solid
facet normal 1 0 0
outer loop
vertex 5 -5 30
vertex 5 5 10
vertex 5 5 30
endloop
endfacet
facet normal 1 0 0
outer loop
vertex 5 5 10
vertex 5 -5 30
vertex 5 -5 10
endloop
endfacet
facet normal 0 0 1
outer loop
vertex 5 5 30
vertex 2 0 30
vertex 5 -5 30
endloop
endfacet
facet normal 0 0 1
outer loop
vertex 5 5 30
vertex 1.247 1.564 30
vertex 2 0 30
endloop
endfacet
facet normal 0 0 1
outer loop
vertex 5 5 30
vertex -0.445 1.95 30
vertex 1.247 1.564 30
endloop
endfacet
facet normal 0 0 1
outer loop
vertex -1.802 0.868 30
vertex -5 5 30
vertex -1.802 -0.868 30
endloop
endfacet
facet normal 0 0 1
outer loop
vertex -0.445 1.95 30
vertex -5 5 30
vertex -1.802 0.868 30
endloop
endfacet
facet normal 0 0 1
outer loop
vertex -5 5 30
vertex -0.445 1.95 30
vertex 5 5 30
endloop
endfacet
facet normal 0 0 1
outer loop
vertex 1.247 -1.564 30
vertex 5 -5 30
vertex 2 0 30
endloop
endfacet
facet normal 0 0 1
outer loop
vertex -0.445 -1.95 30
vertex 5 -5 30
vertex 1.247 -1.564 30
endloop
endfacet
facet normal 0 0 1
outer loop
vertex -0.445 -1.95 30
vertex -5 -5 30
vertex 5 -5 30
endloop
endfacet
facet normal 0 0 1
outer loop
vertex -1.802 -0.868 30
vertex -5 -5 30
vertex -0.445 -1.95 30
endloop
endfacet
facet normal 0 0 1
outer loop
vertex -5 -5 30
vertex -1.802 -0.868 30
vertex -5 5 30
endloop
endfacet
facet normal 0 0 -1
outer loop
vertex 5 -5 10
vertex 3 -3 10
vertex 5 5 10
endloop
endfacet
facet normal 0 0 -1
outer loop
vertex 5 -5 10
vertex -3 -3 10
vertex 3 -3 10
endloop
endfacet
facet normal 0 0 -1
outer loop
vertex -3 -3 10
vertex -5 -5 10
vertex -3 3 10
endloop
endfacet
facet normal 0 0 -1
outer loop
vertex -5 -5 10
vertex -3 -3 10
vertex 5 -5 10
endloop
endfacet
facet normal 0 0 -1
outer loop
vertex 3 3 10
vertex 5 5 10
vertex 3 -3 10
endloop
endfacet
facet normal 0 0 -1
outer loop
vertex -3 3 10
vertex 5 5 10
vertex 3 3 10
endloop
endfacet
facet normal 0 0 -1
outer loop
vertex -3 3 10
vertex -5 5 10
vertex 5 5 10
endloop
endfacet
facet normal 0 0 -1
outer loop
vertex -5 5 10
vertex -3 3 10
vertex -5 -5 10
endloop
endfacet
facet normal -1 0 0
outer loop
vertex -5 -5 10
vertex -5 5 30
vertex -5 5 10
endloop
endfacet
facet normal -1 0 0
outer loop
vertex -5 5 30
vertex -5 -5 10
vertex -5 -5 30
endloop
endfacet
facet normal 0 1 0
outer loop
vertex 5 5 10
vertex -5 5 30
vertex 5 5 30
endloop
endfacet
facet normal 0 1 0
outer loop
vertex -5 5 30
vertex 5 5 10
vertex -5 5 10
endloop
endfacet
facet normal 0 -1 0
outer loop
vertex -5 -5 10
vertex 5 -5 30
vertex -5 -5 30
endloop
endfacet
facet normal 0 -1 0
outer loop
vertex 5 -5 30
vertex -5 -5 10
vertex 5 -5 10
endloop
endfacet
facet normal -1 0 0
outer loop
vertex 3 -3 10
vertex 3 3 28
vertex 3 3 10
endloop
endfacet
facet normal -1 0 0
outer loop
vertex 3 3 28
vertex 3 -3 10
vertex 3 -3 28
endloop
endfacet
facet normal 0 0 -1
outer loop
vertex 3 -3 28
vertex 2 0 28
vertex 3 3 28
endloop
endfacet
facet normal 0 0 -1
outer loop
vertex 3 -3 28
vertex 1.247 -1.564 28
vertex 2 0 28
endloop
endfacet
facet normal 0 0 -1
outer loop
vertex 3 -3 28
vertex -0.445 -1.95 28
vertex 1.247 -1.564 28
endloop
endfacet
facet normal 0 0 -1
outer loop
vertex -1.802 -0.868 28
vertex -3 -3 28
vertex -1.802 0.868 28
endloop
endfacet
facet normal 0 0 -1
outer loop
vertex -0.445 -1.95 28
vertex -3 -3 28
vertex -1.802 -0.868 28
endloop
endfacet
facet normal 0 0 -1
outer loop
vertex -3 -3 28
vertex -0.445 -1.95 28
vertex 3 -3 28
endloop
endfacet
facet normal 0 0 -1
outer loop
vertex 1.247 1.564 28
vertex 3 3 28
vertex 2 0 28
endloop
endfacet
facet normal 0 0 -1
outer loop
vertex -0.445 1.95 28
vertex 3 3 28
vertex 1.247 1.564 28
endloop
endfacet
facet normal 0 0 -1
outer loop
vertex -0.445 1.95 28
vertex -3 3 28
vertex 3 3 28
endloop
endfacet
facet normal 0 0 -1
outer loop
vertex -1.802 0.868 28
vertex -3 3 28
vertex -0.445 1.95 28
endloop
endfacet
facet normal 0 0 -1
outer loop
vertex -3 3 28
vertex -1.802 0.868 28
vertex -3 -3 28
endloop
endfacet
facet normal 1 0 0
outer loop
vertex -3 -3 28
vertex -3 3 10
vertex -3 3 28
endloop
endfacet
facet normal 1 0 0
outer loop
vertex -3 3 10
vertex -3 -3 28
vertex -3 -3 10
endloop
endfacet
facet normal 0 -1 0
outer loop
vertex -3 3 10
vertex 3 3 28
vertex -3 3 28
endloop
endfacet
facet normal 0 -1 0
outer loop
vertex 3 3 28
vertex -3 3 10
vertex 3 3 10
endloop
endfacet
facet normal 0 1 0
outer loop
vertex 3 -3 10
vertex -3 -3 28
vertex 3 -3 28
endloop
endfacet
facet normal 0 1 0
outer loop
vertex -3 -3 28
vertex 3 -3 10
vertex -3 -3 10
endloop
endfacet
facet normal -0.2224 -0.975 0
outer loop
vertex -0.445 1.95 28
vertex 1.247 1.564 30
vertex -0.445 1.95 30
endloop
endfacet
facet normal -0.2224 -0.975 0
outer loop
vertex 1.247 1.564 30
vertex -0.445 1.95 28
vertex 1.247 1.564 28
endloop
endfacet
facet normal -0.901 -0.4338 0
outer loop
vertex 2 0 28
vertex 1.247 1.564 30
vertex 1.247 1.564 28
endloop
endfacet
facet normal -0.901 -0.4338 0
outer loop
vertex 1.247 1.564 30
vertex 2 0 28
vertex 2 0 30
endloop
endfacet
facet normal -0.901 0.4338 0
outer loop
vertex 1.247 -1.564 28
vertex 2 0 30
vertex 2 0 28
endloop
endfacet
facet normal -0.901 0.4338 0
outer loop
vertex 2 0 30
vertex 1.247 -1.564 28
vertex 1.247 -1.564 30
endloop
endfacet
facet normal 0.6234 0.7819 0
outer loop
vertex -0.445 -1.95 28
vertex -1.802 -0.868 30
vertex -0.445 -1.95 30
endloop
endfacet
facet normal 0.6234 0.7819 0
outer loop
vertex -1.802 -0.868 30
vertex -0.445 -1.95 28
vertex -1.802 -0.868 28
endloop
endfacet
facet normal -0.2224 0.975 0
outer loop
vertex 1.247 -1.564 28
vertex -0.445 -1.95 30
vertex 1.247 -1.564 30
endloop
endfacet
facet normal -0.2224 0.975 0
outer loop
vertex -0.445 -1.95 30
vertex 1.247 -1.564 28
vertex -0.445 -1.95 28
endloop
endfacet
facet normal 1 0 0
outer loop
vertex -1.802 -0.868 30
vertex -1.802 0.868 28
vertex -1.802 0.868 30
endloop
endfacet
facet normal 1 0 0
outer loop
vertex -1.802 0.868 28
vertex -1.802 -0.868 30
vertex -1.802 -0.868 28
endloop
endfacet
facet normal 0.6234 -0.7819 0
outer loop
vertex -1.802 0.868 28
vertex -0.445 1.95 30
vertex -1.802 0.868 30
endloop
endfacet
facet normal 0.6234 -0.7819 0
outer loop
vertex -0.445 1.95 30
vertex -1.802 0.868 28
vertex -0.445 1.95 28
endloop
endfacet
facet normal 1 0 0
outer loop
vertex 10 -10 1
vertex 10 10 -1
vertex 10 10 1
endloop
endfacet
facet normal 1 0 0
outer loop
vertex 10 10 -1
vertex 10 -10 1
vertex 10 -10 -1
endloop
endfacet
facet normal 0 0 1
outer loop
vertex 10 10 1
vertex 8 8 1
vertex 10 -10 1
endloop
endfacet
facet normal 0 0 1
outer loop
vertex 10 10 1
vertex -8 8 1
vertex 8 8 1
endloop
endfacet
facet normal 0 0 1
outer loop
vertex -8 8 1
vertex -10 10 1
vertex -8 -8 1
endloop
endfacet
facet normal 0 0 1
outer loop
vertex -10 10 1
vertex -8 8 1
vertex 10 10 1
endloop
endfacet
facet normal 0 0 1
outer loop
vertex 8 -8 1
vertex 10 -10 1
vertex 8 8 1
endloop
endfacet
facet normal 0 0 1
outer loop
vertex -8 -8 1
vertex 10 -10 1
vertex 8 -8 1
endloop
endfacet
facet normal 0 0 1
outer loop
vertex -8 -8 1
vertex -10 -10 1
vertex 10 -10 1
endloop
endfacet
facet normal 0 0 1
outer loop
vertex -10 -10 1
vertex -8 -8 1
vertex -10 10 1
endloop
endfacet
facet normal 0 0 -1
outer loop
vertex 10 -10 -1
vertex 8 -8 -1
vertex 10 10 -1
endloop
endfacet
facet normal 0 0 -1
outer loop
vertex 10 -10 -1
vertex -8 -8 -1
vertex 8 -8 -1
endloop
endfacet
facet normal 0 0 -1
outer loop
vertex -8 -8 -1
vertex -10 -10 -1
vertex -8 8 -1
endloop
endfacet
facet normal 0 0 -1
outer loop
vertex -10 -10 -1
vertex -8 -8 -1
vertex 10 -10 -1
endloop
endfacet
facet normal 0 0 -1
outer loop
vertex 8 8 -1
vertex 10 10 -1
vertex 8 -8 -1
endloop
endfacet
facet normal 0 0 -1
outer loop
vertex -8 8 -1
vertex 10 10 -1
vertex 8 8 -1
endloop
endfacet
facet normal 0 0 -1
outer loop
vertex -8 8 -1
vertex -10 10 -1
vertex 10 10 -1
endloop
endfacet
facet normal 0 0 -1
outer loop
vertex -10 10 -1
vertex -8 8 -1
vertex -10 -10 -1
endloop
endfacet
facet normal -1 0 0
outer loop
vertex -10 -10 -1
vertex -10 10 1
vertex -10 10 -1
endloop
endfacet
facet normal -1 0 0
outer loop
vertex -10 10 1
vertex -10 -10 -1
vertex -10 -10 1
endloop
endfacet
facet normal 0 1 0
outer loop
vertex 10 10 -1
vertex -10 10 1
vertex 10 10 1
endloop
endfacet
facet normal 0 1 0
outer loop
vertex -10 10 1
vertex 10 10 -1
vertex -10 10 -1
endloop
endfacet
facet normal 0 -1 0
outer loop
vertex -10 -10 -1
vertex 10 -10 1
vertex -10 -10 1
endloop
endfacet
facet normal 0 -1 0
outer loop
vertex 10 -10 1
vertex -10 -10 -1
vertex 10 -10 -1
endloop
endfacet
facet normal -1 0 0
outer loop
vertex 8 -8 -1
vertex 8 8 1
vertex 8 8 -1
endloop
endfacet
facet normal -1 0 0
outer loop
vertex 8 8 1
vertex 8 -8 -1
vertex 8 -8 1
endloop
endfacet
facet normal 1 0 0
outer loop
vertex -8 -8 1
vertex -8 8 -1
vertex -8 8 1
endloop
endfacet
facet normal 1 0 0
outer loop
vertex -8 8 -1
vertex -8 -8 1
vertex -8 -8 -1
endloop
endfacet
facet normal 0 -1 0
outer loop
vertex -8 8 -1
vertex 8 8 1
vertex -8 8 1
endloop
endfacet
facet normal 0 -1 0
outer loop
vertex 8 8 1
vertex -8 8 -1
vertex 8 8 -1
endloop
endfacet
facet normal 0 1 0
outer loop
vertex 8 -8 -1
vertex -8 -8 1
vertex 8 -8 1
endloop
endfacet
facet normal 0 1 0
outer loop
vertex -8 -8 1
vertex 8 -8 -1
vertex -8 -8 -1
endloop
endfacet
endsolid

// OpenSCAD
dh = 10;
width = 10;
height = 10;
cheight = 20;
thickness = 2;

//1st Base
difference() {
translate([0,0,dh+cheight/2])
difference() {
    cube([width,height,cheight], true);
    translate([0,0,-thickness]) cube([width-thickness*2,height-thickness*2,cheight], true);
}
//Holes
translate([0,0,cheight+dh-thickness*1.5]) cylinder(thickness*2,2,2);
}

bwidth = 20;
bheight = 20;

//2nd Base
difference() {
    cube([bwidth,bheight,thickness], true);
    cube([bwidth-thickness*2,bheight-thickness*2,thickness*2], true);
}

//Rods
x11 = bheight/2;
x12 = bheight/2-thickness;
y11 = bwidth/2;
y12 = bwidth/2-thickness;


x21 = height/2;
x22 = height/2-thickness;
y21 = width/2;
y22 = width/2-thickness;

polyhedron (points = [
                        [x11,y11,thickness/2],
                        [x12,y11,thickness/2],
                        [x12,y12,thickness/2],
                        [x11,y12,thickness/2],
                        [x21,y21,dh],
                        [x22,y21,dh],
                        [x22,y22,dh],
                        [x21,y22,dh]
                      ],
             faces = [
                        [0,1,2,3],[0,4,5,1],[1,5,6,2],[2,6,7,3],[3,7,4,0],[4,5,6,7]
                     ]
            );

polyhedron (points = [
                        [-x11,y11,thickness/2],
                        [-x12,y11,thickness/2],
                        [-x12,y12,thickness/2],
                        [-x11,y12,thickness/2],
                        [-x21,y21,dh],
                        [-x22,y21,dh],
                        [-x22,y22,dh],
                        [-x21,y22,dh]
                      ],
             faces = [
                        [0,1,2,3],[0,4,5,1],[1,5,6,2],[2,6,7,3],[3,7,4,0],[4,5,6,7]
                     ]
            );

polyhedron (points = [
                        [x11,-y11,thickness/2],
                        [x12,-y11,thickness/2],
                        [x12,-y12,thickness/2],
                        [x11,-y12,thickness/2],
                        [x21,-y21,dh],
                        [x22,-y21,dh],
                        [x22,-y22,dh],
                        [x21,-y22,dh]
                      ],
             faces = [
                        [0,1,2,3],[0,4,5,1],[1,5,6,2],[2,6,7,3],[3,7,4,0],[4,5,6,7]
                     ]
            );
            
polyhedron (points = [
                        [-x11,-y11,thickness/2],
                        [-x12,-y11,thickness/2],
                        [-x12,-y12,thickness/2],
                        [-x11,-y12,thickness/2],
                        [-x21,-y21,dh],
                        [-x22,-y21,dh],
                        [-x22,-y22,dh],
                        [-x21,-y22,dh]
                      ],
             faces = [
                        [0,1,2,3],[0,4,5,1],[1,5,6,2],[2,6,7,3],[3,7,4,0],[4,5,6,7]
                     ]
            );
 
